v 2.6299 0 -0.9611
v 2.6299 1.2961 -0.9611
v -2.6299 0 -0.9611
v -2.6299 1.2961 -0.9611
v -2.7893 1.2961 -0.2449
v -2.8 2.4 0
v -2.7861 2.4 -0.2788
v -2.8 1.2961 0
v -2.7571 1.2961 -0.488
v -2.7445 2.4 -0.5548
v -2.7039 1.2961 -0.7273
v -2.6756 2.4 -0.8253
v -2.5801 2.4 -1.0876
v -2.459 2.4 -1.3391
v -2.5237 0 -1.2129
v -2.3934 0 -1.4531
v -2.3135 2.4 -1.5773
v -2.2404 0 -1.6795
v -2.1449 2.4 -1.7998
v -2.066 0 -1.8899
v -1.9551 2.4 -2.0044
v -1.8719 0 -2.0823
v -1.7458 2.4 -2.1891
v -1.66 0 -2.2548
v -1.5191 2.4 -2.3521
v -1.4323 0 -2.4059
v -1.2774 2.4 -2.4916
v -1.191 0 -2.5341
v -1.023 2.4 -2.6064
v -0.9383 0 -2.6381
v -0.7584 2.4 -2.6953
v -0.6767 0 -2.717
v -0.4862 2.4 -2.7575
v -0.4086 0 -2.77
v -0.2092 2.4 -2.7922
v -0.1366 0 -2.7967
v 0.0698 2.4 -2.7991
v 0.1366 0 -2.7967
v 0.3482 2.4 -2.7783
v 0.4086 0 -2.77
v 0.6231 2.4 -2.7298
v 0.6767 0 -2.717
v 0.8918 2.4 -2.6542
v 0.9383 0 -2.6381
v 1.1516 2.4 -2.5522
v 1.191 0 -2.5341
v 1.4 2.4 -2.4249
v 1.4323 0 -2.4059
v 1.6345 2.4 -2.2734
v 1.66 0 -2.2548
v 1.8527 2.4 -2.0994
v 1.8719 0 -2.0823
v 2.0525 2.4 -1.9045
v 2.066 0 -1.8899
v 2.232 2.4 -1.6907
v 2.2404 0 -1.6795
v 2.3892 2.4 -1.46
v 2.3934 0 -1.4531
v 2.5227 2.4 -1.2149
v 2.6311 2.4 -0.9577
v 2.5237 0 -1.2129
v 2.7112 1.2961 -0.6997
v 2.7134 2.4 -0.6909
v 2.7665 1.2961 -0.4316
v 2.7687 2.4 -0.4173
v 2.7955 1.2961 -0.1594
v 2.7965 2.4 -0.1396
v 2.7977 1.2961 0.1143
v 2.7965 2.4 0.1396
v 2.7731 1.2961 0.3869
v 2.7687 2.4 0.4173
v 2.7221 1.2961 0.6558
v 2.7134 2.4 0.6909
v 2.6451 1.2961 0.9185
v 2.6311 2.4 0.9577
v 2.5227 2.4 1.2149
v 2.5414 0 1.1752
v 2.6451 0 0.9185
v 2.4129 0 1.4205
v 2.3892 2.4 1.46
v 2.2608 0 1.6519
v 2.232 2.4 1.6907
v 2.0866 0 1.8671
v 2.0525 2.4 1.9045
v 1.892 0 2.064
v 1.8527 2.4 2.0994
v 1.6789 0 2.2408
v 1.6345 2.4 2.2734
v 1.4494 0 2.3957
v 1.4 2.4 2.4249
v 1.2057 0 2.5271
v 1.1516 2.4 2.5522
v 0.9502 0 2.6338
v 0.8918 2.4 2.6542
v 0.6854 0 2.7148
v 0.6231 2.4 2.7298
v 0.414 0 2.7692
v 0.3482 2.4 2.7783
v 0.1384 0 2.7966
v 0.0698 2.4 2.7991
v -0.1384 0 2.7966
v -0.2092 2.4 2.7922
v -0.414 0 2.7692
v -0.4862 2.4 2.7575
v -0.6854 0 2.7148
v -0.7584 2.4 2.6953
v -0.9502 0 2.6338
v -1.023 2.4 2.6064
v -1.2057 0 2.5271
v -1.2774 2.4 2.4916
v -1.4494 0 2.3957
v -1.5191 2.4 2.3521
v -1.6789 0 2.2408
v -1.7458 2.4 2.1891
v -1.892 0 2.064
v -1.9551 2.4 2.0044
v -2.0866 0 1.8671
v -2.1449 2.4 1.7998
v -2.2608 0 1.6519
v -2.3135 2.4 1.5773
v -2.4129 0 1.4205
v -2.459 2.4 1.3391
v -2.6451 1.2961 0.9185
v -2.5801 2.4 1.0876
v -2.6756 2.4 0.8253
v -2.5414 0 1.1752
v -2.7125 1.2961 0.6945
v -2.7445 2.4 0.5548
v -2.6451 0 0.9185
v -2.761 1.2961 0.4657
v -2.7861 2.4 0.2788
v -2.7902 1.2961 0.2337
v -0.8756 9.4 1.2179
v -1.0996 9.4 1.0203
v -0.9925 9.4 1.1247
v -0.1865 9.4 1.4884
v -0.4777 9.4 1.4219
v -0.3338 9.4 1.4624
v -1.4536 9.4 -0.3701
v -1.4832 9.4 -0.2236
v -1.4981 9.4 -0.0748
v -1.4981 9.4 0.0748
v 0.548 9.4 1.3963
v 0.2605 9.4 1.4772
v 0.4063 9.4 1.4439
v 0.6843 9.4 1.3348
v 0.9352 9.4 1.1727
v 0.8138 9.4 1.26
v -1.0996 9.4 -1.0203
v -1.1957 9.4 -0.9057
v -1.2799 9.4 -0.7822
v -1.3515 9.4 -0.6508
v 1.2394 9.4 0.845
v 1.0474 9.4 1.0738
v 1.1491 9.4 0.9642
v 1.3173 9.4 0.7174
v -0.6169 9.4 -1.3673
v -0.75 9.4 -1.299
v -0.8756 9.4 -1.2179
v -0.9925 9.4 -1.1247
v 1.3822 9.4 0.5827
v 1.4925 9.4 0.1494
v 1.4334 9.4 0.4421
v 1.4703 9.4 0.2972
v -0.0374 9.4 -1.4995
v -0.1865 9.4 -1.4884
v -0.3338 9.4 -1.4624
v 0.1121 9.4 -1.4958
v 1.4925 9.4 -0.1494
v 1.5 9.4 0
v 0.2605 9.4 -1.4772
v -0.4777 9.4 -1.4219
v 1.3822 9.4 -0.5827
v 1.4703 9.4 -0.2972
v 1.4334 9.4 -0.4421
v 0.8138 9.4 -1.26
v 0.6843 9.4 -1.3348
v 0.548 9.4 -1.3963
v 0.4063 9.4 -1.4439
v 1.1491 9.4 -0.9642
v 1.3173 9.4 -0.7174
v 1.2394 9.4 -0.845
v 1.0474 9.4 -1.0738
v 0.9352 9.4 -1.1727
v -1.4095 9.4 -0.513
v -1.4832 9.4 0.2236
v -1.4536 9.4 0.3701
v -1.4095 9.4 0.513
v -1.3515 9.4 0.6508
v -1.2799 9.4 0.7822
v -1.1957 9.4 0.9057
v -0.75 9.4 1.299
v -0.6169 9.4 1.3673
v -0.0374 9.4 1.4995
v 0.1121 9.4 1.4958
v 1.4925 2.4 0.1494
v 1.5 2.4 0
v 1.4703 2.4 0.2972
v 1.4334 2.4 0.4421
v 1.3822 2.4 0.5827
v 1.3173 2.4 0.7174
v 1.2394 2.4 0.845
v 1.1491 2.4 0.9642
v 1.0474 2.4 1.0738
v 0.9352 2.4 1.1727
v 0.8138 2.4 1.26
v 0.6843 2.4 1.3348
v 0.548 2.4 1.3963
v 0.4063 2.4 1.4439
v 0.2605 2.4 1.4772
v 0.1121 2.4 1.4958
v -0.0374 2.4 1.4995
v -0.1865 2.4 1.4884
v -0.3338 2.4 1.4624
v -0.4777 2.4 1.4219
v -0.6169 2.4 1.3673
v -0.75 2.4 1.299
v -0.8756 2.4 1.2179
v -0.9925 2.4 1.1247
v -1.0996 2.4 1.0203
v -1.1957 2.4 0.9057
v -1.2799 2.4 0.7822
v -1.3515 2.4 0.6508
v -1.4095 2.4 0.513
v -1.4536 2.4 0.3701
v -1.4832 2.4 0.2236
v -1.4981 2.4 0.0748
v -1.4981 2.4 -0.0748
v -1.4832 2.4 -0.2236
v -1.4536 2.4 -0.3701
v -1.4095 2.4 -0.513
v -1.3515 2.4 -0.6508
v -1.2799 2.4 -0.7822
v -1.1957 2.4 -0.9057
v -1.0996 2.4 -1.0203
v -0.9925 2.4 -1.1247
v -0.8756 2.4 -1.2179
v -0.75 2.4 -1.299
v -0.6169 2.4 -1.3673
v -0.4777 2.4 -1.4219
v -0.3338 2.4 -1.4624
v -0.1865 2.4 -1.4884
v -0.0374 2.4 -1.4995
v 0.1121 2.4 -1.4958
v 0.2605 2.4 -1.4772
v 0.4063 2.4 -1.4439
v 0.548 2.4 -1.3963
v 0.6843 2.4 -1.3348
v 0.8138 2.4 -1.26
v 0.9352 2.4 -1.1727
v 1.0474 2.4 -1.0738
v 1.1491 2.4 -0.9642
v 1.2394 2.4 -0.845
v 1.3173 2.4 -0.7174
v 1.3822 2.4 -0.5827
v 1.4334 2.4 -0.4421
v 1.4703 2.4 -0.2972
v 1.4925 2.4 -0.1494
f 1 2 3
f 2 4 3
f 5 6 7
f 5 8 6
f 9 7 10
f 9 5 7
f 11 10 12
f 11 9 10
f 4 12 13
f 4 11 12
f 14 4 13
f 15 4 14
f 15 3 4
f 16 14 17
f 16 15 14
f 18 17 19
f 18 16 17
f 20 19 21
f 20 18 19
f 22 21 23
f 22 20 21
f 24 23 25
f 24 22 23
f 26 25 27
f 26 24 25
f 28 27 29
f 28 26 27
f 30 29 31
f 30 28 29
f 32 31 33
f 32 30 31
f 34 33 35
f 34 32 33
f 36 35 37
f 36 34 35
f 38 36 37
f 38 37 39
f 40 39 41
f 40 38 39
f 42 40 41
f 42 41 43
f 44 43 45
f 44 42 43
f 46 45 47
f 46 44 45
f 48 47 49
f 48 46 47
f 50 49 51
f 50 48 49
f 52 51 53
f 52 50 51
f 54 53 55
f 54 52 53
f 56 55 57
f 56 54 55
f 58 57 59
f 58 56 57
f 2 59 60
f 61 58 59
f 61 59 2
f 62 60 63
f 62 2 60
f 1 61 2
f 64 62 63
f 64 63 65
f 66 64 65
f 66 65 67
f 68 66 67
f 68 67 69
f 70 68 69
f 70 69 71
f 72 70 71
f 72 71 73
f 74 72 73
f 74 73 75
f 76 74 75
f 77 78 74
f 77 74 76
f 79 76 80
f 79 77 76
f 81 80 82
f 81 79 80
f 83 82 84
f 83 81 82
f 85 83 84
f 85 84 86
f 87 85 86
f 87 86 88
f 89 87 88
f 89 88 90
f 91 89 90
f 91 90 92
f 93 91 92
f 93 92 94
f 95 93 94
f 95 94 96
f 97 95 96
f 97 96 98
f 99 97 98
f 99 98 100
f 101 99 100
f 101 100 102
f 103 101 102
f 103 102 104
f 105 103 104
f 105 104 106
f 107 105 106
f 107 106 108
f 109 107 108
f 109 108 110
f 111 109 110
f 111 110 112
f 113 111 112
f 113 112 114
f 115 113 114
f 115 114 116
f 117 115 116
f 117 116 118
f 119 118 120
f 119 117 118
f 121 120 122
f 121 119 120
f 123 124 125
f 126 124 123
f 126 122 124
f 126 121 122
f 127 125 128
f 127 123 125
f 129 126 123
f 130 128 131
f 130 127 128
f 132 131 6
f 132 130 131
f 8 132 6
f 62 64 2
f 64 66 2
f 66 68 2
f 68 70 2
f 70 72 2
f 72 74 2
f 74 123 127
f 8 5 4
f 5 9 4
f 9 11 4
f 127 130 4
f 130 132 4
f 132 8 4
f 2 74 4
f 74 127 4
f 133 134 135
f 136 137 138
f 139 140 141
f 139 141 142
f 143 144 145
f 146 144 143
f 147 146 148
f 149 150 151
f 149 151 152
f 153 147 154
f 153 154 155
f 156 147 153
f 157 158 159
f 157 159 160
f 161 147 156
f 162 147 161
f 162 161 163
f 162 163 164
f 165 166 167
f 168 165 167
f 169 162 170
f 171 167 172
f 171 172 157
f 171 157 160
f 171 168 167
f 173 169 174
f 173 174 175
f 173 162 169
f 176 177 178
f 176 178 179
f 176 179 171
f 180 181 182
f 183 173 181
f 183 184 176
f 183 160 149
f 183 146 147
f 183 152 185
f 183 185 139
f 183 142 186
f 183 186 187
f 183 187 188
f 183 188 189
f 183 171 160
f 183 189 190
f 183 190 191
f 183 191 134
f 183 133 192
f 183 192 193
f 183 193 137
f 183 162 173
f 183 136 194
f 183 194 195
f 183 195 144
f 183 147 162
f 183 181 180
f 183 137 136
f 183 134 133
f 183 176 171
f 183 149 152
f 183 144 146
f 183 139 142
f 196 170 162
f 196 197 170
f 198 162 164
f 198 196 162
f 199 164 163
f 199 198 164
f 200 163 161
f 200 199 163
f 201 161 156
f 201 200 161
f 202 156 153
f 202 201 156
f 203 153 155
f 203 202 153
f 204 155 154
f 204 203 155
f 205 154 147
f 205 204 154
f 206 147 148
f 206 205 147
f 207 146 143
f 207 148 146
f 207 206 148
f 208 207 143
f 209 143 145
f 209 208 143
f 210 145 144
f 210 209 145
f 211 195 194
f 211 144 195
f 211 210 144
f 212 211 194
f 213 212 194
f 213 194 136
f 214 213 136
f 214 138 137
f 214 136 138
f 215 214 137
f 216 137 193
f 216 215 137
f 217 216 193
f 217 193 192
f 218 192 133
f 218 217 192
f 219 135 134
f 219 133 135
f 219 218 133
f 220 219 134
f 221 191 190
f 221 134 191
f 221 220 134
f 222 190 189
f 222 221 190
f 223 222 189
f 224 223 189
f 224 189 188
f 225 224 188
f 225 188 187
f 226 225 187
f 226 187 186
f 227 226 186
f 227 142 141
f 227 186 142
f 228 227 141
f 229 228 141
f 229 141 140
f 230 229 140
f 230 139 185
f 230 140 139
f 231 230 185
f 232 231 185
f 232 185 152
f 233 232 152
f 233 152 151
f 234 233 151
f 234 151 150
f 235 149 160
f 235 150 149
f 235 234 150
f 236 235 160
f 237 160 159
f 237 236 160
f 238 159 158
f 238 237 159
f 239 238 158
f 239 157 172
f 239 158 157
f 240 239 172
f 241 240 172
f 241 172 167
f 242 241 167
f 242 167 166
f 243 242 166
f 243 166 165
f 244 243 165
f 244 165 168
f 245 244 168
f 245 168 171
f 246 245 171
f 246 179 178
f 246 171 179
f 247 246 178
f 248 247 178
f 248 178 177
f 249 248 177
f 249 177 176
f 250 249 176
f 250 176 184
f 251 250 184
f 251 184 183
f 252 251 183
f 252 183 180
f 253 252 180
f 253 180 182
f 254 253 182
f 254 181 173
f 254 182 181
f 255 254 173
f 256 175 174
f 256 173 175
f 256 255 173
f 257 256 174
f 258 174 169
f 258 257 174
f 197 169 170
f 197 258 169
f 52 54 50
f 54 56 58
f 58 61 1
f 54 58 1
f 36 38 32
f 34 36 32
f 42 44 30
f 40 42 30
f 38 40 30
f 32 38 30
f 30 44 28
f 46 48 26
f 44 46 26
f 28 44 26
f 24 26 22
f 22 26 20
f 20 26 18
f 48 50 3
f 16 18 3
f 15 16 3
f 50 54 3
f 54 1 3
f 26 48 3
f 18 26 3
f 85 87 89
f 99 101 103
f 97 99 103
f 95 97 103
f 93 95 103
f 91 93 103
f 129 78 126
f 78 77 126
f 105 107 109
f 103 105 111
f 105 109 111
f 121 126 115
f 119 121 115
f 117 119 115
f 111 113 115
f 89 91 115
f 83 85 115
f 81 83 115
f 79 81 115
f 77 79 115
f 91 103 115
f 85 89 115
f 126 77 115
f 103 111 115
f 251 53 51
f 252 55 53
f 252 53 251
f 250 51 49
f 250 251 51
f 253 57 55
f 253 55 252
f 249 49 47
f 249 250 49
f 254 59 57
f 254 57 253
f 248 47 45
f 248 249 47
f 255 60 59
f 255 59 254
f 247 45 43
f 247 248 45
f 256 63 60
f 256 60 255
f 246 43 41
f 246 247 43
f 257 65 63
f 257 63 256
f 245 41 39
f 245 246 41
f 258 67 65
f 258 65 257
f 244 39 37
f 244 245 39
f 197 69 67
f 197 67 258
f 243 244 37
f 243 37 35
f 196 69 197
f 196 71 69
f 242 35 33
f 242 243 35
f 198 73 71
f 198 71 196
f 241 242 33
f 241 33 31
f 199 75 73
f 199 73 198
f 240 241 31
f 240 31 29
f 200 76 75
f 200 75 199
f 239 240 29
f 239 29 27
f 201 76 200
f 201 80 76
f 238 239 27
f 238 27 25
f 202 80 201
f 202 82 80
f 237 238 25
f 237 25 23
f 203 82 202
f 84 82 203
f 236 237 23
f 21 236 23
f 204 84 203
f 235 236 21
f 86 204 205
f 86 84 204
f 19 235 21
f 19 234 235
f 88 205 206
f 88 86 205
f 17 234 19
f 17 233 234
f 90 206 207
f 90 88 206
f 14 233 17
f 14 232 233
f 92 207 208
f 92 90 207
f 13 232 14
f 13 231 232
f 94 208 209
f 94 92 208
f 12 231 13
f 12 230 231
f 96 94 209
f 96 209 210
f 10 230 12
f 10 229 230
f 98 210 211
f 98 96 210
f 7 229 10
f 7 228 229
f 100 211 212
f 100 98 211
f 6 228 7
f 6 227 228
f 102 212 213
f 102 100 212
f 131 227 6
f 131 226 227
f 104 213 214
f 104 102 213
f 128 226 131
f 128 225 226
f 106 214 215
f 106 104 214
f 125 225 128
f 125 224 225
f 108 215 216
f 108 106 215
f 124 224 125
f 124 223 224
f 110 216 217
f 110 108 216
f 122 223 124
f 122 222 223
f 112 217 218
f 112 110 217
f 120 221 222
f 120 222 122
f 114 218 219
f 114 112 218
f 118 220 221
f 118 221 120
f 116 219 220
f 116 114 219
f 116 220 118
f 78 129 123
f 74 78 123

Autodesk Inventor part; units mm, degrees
ref_plane "YZ Plane" through (0, 0, 0) normal (1, 0, 0) x (0, 1, 0)
ref_plane "XZ Plane" through (0, 0, 0) normal (0, 1, 0) x (-1, 0, 0)
ref_plane "XY Plane" through (0, 0, 0) normal (0, 0, 1) x (1, 0, 0)
sketch "Esboço1" plane through (0, 0, 0) normal (0, 1, 0) x (-1, 0, 0)
  circle A0 centre (0, 0) radius 2.8
  dimension "d0" = 5.6
extrude "Extrusão1" add sketch "Esboço1" along normal blind 2.4
sketch "Esboço2" plane through (0, 0, 0) normal (1, 0, 0) x (0, 1, 0)
  line L0 (0, 0.9185) -> (1.2961, 0.9185)
  line L1 (1.2961, 0.9185) -> (1.2961, -0.9611)
  line L2 (1.2961, -0.9611) -> (0, -0.9611)
  line L3 (0, -0.9611) -> (0, 0.9185)
  point P0 (0, 0)
extrude "Extrusão2" cut sketch "Esboço2" along normal through all both and the other way through all
sketch "Esboço3" plane through (0, 2.4, 0) normal (0, 1, 0) x (1, 0, 0)
  circle A0 centre (0, 0) radius 2.8 projected
  circle A1 centre (0, 0) radius 1.5
  dimension "d5" = 3
extrude "Extrusão3" add sketch "Esboço3" along normal blind 7 contours A1
thread "Rosca1" size "M3x0.5" class "6g" standard "ANSI Metric M Profile" full length
properties part number "Parafuso-M3-7"
